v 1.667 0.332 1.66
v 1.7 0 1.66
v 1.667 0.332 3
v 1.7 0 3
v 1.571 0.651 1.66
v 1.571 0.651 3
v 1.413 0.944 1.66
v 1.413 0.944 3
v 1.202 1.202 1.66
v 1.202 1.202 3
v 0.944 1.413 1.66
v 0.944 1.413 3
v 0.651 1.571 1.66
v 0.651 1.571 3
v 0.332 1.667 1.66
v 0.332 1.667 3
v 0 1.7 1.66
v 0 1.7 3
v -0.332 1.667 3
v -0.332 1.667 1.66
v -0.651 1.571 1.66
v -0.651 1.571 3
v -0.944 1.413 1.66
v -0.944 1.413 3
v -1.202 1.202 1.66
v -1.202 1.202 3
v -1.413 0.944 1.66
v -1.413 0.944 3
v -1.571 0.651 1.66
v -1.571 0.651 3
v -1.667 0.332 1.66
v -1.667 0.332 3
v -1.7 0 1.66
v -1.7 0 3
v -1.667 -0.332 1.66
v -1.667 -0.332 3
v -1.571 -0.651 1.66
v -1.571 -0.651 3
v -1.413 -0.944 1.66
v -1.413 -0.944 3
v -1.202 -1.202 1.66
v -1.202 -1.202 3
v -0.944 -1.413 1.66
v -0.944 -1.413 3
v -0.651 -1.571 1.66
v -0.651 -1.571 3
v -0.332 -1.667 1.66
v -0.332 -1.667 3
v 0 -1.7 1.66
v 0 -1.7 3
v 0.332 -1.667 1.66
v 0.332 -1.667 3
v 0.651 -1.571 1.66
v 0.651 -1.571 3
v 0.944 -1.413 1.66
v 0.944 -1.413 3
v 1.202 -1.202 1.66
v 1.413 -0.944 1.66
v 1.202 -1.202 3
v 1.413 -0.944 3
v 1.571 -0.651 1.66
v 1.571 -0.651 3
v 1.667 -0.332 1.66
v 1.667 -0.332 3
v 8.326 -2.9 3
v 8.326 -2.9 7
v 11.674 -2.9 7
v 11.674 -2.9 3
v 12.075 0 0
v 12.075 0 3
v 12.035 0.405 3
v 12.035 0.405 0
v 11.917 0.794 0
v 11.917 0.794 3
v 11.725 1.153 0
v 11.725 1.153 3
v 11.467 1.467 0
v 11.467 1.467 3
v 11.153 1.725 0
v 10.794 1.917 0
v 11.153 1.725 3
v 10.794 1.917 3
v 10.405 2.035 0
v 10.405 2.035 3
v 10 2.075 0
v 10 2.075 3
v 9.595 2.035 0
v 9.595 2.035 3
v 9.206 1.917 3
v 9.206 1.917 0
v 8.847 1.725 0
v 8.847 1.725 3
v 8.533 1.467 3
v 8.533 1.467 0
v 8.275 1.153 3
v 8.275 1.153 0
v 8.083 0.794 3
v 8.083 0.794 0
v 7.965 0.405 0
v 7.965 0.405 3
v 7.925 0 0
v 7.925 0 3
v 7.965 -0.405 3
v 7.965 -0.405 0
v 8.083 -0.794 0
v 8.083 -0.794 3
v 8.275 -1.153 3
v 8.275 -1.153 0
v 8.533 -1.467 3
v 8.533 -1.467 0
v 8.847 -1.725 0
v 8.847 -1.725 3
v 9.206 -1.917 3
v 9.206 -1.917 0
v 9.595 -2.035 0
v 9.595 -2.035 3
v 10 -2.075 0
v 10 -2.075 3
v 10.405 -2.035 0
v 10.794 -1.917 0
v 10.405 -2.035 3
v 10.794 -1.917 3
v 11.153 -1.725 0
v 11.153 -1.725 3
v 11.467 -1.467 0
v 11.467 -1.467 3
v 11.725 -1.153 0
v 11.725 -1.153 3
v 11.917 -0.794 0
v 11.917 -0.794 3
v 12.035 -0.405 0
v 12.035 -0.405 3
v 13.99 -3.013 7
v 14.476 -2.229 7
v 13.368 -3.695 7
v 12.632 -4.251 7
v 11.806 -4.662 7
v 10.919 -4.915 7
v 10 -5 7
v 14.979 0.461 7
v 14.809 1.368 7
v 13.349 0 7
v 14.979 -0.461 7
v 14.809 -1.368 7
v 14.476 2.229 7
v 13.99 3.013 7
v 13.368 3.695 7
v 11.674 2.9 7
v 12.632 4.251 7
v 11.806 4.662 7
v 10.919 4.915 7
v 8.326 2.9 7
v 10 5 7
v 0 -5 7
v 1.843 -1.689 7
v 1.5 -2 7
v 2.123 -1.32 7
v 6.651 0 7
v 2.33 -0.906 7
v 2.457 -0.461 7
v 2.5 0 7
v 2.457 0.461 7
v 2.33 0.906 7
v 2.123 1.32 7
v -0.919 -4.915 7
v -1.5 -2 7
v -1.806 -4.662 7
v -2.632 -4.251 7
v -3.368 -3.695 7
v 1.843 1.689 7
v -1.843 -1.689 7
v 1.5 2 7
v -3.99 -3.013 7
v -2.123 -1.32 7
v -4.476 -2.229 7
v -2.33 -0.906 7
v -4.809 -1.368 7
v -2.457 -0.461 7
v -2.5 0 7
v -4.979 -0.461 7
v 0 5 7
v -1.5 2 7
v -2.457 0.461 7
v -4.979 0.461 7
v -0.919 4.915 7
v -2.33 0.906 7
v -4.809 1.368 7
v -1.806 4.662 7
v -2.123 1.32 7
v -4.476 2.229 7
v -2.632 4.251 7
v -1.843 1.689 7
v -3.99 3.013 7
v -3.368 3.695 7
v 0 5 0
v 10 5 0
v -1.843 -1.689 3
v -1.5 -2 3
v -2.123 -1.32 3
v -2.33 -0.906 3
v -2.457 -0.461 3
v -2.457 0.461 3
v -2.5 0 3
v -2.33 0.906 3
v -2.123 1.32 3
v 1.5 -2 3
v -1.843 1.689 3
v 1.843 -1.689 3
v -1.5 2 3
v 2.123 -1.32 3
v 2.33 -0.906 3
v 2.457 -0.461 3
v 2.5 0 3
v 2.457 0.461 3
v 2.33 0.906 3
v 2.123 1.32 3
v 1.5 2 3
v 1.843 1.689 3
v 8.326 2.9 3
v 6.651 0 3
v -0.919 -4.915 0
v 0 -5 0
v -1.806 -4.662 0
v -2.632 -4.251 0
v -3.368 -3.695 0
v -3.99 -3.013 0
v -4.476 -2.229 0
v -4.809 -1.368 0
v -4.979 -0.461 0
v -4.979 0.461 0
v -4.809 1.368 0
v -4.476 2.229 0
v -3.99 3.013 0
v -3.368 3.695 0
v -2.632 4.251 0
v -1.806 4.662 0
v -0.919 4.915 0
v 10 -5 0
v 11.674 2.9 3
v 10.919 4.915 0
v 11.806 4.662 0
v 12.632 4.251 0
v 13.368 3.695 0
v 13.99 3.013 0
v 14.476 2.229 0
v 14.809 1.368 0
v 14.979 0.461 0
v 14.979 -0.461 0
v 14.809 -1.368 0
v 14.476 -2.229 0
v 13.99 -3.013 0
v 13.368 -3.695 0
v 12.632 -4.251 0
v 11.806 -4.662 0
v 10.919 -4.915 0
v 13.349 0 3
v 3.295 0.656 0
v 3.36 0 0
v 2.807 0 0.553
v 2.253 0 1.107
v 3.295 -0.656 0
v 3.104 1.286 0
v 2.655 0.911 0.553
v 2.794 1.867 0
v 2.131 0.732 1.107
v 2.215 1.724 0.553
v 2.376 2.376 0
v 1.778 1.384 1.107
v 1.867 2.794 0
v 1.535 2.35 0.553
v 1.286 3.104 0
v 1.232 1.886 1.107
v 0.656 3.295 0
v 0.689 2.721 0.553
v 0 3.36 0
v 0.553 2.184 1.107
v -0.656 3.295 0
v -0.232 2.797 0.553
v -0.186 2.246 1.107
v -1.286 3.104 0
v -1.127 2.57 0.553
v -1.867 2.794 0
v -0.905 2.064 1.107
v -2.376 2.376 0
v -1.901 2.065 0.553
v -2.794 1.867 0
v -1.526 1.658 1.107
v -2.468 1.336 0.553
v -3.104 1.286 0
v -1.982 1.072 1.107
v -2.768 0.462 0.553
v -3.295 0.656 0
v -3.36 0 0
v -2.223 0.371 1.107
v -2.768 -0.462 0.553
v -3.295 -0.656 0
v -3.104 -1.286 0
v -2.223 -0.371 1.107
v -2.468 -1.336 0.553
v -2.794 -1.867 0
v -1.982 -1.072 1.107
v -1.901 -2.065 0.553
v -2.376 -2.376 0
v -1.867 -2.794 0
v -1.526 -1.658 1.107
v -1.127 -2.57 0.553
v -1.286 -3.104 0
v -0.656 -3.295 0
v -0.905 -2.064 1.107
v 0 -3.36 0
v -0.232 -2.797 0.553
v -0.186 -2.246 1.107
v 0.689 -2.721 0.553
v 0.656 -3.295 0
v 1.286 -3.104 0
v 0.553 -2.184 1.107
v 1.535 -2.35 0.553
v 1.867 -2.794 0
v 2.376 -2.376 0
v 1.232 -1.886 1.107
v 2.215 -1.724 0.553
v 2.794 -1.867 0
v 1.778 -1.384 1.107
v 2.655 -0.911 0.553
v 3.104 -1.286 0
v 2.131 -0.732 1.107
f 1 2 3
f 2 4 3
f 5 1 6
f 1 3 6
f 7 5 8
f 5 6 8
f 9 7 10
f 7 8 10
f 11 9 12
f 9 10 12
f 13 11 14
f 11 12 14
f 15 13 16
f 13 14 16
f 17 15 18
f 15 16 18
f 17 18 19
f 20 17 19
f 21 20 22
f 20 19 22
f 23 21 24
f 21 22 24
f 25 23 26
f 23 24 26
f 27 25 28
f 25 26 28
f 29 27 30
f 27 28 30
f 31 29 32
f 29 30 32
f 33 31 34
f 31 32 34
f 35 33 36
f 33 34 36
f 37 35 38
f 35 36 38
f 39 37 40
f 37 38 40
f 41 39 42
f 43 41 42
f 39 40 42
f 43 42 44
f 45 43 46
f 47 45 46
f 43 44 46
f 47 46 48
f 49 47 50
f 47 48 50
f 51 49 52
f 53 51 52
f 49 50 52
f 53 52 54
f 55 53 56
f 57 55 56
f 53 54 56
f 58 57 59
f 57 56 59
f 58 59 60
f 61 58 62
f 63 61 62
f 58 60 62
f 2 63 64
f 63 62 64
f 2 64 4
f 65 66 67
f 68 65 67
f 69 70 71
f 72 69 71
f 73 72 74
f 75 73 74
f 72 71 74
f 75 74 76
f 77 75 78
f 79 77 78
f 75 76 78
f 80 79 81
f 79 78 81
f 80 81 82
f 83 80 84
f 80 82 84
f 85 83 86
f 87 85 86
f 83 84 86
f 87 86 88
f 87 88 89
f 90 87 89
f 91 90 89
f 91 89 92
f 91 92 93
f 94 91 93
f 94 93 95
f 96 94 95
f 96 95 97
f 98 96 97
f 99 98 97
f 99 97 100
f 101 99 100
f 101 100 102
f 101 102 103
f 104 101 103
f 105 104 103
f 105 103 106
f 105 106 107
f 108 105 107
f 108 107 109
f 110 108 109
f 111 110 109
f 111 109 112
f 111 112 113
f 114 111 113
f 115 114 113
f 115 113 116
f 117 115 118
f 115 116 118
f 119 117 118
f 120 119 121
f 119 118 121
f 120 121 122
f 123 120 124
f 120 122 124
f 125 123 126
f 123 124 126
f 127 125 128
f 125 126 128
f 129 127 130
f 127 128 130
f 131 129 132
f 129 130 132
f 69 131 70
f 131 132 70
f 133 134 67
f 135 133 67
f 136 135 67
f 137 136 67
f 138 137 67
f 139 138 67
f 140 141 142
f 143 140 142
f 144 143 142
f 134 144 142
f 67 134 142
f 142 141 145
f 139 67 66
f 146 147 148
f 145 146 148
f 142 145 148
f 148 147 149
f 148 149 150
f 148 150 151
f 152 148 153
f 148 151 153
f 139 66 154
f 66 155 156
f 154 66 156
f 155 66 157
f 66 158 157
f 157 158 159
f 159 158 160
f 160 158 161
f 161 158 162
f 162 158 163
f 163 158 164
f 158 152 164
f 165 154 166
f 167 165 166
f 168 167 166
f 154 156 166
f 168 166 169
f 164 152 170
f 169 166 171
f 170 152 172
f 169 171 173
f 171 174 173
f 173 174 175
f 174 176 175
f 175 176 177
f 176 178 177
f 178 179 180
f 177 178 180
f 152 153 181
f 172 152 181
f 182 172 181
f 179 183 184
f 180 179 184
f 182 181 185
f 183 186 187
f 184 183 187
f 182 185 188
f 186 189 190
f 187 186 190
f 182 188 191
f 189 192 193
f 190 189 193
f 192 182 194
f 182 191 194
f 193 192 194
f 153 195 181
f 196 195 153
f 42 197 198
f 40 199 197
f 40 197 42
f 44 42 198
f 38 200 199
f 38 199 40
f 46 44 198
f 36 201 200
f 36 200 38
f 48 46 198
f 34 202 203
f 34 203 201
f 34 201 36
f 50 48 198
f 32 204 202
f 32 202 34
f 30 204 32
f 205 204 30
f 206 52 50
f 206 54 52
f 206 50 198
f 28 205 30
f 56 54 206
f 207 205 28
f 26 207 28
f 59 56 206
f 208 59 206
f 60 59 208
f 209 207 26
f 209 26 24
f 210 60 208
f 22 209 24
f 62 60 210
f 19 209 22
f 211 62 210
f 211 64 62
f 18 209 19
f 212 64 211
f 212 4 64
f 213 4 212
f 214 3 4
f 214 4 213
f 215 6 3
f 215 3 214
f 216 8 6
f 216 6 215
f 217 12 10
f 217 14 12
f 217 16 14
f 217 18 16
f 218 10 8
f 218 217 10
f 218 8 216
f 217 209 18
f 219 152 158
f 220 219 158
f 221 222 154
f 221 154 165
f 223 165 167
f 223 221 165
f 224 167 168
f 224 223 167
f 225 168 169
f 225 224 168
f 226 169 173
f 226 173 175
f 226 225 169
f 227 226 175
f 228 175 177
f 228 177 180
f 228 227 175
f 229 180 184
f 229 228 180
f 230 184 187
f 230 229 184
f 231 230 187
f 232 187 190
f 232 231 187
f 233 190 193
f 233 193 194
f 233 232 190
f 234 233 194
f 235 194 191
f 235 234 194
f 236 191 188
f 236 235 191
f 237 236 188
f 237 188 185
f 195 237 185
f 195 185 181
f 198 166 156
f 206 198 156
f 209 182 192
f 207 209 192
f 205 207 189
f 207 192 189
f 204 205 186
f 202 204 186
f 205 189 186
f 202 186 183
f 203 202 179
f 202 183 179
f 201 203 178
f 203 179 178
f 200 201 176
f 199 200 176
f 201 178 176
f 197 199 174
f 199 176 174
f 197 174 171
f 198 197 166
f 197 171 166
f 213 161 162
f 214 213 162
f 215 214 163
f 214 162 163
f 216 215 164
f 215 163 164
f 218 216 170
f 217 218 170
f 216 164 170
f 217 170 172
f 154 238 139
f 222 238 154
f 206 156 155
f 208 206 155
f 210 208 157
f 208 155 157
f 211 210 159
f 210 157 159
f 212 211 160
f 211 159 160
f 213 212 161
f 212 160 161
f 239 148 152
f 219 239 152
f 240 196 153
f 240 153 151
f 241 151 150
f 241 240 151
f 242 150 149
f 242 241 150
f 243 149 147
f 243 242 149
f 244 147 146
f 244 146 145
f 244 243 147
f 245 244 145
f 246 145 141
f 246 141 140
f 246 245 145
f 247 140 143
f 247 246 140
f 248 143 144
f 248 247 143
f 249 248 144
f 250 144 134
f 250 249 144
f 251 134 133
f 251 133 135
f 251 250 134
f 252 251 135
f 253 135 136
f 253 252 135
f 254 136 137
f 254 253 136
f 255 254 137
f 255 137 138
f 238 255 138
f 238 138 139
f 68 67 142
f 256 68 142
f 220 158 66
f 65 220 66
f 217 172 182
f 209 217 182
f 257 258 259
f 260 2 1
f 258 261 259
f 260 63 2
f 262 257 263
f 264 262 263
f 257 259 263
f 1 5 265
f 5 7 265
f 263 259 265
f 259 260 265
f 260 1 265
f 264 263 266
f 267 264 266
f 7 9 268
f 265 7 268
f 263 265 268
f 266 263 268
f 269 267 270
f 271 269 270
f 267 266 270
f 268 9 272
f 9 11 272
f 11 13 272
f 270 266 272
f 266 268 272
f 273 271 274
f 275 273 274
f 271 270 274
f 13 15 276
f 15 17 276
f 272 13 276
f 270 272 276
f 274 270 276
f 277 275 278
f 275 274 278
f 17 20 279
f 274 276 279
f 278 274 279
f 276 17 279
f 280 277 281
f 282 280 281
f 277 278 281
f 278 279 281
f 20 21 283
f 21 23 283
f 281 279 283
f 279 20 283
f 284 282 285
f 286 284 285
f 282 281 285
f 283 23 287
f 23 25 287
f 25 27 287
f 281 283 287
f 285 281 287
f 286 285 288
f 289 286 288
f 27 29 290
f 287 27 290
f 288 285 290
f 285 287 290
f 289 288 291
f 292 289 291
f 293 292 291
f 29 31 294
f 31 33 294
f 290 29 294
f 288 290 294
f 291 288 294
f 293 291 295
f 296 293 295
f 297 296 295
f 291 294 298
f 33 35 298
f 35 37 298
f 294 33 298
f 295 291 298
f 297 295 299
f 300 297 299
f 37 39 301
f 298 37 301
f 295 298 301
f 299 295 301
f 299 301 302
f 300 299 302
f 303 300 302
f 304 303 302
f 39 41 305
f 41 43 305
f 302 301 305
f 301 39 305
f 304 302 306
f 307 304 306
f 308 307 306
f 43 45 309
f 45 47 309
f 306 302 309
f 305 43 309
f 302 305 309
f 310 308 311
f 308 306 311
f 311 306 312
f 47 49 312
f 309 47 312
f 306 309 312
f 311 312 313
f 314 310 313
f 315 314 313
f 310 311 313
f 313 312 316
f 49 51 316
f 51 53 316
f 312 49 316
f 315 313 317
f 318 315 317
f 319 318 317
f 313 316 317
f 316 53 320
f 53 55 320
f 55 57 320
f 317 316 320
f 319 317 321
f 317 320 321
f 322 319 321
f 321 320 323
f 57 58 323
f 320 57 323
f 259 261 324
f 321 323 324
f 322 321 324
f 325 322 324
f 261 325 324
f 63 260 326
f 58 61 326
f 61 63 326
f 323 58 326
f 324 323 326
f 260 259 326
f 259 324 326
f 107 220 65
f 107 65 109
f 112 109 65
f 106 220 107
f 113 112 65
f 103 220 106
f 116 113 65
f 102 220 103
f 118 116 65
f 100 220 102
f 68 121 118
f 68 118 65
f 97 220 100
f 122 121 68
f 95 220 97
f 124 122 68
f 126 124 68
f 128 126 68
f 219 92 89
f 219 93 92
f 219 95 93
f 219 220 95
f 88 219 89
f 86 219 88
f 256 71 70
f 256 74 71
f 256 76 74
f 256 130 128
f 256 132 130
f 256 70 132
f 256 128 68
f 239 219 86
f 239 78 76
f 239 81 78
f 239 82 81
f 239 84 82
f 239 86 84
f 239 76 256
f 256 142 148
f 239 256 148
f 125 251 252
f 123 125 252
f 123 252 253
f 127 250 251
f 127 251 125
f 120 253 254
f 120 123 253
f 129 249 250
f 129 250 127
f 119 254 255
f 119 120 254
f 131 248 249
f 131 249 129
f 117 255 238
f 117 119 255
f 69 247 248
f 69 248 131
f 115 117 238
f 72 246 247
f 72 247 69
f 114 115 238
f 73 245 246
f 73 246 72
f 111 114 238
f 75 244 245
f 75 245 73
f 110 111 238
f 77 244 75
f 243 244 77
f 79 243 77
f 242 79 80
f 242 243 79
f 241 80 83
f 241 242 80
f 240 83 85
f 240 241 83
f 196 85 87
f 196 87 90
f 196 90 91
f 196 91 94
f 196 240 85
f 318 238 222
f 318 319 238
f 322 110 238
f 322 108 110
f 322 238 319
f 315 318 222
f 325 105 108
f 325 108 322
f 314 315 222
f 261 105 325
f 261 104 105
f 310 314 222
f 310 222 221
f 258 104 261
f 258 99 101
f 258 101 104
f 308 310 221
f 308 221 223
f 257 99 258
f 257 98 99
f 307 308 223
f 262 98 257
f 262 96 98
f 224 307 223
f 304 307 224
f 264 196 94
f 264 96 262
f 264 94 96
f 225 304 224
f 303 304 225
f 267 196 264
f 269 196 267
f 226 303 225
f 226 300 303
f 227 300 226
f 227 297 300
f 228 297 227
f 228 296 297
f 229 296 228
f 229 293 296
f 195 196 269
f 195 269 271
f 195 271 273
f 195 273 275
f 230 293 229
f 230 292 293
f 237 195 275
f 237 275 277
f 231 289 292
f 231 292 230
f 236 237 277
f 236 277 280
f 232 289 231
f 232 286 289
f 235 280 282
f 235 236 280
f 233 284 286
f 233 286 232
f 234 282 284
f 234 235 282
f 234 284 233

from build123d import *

# Parameters (mm, degrees)
EXTRUDE_1_DEPTH              = 7
CUT_EXTRUDE_1_DEPTH          = 4
HOLE_WIZARD_M3_1_D           = 3.4
HOLE_WIZARD_M3_1_DEPTH       = 7.5
HOLE_WIZARD_M3_1_CSINK_D     = 6.72
HOLE_WIZARD_M3_1_CSINK_ANGLE = 90
HOLE_WIZARD_M3_1_TIP         = 1.021463052
HOLE_WIZARD_1_D              = 4.15
CUT_EXTRUDE_2_DEPTH          = 4


with BuildPart() as part:
    # 草图1 → 凸台-拉伸1 (new body)
    with BuildSketch(Plane.XY):
        with BuildLine():
            Line((0, 5), (10, 5))
            ThreePointArc((10, 5), (15, 0), (10, -5))
            Line((10, -5), (0, -5))
            ThreePointArc((0, -5), (-5, 0), (0, 5))
        make_face()
    extrude(amount=EXTRUDE_1_DEPTH)

    # 草图2 → 切除-拉伸1 (cut)
    with BuildSketch(Plane.XY.offset(7)):
        with BuildLine():
            Line((1.5, 2), (-1.5, 2))
            ThreePointArc((-1.5, 2), (-2.5, 0), (-1.5, -2))
            Line((-1.5, -2), (1.5, -2))
            ThreePointArc((1.5, -2), (2.236067977, -1.118033989), (2.5, 0))
            ThreePointArc((2.5, 0), (2.236067977, 1.118033989), (1.5, 2))
        make_face()
    extrude(amount=-CUT_EXTRUDE_1_DEPTH, mode=Mode.SUBTRACT)

    # M3 六角凹锥坑螺钉的锥形沉头孔1
    with Locations(Plane(origin=(0, 0, 0), x_dir=(-1, 0, 0), z_dir=(0, 0, -1))):
        with Locations((0, 0)):
            CounterSinkHole(HOLE_WIZARD_M3_1_D / 2, HOLE_WIZARD_M3_1_CSINK_D / 2, depth=HOLE_WIZARD_M3_1_DEPTH, counter_sink_angle=HOLE_WIZARD_M3_1_CSINK_ANGLE)
            with Locations((0, 0, -(HOLE_WIZARD_M3_1_DEPTH + HOLE_WIZARD_M3_1_TIP / 2))):  # 118° drill point
                Cone(0, HOLE_WIZARD_M3_1_D / 2, HOLE_WIZARD_M3_1_TIP, mode=Mode.SUBTRACT)

    # 孔1 (through all)
    with Locations(Plane(origin=(0, 0, 0), x_dir=(-1, 0, 0), z_dir=(0, 0, -1))):
        with Locations((-10, 0)):
            Hole(HOLE_WIZARD_1_D / 2)

    # 草图7 → 切除-拉伸2 (cut)
    with BuildSketch(Plane.XY.offset(7)):
        Polygon((8.325684219, -2.9), (11.674315781, -2.9), (13.348631561, 0), (11.674315781, 2.9), (8.325684219, 2.9), (6.651368439, 0), align=None)
    extrude(amount=-CUT_EXTRUDE_2_DEPTH, mode=Mode.SUBTRACT)


solid = part.part
